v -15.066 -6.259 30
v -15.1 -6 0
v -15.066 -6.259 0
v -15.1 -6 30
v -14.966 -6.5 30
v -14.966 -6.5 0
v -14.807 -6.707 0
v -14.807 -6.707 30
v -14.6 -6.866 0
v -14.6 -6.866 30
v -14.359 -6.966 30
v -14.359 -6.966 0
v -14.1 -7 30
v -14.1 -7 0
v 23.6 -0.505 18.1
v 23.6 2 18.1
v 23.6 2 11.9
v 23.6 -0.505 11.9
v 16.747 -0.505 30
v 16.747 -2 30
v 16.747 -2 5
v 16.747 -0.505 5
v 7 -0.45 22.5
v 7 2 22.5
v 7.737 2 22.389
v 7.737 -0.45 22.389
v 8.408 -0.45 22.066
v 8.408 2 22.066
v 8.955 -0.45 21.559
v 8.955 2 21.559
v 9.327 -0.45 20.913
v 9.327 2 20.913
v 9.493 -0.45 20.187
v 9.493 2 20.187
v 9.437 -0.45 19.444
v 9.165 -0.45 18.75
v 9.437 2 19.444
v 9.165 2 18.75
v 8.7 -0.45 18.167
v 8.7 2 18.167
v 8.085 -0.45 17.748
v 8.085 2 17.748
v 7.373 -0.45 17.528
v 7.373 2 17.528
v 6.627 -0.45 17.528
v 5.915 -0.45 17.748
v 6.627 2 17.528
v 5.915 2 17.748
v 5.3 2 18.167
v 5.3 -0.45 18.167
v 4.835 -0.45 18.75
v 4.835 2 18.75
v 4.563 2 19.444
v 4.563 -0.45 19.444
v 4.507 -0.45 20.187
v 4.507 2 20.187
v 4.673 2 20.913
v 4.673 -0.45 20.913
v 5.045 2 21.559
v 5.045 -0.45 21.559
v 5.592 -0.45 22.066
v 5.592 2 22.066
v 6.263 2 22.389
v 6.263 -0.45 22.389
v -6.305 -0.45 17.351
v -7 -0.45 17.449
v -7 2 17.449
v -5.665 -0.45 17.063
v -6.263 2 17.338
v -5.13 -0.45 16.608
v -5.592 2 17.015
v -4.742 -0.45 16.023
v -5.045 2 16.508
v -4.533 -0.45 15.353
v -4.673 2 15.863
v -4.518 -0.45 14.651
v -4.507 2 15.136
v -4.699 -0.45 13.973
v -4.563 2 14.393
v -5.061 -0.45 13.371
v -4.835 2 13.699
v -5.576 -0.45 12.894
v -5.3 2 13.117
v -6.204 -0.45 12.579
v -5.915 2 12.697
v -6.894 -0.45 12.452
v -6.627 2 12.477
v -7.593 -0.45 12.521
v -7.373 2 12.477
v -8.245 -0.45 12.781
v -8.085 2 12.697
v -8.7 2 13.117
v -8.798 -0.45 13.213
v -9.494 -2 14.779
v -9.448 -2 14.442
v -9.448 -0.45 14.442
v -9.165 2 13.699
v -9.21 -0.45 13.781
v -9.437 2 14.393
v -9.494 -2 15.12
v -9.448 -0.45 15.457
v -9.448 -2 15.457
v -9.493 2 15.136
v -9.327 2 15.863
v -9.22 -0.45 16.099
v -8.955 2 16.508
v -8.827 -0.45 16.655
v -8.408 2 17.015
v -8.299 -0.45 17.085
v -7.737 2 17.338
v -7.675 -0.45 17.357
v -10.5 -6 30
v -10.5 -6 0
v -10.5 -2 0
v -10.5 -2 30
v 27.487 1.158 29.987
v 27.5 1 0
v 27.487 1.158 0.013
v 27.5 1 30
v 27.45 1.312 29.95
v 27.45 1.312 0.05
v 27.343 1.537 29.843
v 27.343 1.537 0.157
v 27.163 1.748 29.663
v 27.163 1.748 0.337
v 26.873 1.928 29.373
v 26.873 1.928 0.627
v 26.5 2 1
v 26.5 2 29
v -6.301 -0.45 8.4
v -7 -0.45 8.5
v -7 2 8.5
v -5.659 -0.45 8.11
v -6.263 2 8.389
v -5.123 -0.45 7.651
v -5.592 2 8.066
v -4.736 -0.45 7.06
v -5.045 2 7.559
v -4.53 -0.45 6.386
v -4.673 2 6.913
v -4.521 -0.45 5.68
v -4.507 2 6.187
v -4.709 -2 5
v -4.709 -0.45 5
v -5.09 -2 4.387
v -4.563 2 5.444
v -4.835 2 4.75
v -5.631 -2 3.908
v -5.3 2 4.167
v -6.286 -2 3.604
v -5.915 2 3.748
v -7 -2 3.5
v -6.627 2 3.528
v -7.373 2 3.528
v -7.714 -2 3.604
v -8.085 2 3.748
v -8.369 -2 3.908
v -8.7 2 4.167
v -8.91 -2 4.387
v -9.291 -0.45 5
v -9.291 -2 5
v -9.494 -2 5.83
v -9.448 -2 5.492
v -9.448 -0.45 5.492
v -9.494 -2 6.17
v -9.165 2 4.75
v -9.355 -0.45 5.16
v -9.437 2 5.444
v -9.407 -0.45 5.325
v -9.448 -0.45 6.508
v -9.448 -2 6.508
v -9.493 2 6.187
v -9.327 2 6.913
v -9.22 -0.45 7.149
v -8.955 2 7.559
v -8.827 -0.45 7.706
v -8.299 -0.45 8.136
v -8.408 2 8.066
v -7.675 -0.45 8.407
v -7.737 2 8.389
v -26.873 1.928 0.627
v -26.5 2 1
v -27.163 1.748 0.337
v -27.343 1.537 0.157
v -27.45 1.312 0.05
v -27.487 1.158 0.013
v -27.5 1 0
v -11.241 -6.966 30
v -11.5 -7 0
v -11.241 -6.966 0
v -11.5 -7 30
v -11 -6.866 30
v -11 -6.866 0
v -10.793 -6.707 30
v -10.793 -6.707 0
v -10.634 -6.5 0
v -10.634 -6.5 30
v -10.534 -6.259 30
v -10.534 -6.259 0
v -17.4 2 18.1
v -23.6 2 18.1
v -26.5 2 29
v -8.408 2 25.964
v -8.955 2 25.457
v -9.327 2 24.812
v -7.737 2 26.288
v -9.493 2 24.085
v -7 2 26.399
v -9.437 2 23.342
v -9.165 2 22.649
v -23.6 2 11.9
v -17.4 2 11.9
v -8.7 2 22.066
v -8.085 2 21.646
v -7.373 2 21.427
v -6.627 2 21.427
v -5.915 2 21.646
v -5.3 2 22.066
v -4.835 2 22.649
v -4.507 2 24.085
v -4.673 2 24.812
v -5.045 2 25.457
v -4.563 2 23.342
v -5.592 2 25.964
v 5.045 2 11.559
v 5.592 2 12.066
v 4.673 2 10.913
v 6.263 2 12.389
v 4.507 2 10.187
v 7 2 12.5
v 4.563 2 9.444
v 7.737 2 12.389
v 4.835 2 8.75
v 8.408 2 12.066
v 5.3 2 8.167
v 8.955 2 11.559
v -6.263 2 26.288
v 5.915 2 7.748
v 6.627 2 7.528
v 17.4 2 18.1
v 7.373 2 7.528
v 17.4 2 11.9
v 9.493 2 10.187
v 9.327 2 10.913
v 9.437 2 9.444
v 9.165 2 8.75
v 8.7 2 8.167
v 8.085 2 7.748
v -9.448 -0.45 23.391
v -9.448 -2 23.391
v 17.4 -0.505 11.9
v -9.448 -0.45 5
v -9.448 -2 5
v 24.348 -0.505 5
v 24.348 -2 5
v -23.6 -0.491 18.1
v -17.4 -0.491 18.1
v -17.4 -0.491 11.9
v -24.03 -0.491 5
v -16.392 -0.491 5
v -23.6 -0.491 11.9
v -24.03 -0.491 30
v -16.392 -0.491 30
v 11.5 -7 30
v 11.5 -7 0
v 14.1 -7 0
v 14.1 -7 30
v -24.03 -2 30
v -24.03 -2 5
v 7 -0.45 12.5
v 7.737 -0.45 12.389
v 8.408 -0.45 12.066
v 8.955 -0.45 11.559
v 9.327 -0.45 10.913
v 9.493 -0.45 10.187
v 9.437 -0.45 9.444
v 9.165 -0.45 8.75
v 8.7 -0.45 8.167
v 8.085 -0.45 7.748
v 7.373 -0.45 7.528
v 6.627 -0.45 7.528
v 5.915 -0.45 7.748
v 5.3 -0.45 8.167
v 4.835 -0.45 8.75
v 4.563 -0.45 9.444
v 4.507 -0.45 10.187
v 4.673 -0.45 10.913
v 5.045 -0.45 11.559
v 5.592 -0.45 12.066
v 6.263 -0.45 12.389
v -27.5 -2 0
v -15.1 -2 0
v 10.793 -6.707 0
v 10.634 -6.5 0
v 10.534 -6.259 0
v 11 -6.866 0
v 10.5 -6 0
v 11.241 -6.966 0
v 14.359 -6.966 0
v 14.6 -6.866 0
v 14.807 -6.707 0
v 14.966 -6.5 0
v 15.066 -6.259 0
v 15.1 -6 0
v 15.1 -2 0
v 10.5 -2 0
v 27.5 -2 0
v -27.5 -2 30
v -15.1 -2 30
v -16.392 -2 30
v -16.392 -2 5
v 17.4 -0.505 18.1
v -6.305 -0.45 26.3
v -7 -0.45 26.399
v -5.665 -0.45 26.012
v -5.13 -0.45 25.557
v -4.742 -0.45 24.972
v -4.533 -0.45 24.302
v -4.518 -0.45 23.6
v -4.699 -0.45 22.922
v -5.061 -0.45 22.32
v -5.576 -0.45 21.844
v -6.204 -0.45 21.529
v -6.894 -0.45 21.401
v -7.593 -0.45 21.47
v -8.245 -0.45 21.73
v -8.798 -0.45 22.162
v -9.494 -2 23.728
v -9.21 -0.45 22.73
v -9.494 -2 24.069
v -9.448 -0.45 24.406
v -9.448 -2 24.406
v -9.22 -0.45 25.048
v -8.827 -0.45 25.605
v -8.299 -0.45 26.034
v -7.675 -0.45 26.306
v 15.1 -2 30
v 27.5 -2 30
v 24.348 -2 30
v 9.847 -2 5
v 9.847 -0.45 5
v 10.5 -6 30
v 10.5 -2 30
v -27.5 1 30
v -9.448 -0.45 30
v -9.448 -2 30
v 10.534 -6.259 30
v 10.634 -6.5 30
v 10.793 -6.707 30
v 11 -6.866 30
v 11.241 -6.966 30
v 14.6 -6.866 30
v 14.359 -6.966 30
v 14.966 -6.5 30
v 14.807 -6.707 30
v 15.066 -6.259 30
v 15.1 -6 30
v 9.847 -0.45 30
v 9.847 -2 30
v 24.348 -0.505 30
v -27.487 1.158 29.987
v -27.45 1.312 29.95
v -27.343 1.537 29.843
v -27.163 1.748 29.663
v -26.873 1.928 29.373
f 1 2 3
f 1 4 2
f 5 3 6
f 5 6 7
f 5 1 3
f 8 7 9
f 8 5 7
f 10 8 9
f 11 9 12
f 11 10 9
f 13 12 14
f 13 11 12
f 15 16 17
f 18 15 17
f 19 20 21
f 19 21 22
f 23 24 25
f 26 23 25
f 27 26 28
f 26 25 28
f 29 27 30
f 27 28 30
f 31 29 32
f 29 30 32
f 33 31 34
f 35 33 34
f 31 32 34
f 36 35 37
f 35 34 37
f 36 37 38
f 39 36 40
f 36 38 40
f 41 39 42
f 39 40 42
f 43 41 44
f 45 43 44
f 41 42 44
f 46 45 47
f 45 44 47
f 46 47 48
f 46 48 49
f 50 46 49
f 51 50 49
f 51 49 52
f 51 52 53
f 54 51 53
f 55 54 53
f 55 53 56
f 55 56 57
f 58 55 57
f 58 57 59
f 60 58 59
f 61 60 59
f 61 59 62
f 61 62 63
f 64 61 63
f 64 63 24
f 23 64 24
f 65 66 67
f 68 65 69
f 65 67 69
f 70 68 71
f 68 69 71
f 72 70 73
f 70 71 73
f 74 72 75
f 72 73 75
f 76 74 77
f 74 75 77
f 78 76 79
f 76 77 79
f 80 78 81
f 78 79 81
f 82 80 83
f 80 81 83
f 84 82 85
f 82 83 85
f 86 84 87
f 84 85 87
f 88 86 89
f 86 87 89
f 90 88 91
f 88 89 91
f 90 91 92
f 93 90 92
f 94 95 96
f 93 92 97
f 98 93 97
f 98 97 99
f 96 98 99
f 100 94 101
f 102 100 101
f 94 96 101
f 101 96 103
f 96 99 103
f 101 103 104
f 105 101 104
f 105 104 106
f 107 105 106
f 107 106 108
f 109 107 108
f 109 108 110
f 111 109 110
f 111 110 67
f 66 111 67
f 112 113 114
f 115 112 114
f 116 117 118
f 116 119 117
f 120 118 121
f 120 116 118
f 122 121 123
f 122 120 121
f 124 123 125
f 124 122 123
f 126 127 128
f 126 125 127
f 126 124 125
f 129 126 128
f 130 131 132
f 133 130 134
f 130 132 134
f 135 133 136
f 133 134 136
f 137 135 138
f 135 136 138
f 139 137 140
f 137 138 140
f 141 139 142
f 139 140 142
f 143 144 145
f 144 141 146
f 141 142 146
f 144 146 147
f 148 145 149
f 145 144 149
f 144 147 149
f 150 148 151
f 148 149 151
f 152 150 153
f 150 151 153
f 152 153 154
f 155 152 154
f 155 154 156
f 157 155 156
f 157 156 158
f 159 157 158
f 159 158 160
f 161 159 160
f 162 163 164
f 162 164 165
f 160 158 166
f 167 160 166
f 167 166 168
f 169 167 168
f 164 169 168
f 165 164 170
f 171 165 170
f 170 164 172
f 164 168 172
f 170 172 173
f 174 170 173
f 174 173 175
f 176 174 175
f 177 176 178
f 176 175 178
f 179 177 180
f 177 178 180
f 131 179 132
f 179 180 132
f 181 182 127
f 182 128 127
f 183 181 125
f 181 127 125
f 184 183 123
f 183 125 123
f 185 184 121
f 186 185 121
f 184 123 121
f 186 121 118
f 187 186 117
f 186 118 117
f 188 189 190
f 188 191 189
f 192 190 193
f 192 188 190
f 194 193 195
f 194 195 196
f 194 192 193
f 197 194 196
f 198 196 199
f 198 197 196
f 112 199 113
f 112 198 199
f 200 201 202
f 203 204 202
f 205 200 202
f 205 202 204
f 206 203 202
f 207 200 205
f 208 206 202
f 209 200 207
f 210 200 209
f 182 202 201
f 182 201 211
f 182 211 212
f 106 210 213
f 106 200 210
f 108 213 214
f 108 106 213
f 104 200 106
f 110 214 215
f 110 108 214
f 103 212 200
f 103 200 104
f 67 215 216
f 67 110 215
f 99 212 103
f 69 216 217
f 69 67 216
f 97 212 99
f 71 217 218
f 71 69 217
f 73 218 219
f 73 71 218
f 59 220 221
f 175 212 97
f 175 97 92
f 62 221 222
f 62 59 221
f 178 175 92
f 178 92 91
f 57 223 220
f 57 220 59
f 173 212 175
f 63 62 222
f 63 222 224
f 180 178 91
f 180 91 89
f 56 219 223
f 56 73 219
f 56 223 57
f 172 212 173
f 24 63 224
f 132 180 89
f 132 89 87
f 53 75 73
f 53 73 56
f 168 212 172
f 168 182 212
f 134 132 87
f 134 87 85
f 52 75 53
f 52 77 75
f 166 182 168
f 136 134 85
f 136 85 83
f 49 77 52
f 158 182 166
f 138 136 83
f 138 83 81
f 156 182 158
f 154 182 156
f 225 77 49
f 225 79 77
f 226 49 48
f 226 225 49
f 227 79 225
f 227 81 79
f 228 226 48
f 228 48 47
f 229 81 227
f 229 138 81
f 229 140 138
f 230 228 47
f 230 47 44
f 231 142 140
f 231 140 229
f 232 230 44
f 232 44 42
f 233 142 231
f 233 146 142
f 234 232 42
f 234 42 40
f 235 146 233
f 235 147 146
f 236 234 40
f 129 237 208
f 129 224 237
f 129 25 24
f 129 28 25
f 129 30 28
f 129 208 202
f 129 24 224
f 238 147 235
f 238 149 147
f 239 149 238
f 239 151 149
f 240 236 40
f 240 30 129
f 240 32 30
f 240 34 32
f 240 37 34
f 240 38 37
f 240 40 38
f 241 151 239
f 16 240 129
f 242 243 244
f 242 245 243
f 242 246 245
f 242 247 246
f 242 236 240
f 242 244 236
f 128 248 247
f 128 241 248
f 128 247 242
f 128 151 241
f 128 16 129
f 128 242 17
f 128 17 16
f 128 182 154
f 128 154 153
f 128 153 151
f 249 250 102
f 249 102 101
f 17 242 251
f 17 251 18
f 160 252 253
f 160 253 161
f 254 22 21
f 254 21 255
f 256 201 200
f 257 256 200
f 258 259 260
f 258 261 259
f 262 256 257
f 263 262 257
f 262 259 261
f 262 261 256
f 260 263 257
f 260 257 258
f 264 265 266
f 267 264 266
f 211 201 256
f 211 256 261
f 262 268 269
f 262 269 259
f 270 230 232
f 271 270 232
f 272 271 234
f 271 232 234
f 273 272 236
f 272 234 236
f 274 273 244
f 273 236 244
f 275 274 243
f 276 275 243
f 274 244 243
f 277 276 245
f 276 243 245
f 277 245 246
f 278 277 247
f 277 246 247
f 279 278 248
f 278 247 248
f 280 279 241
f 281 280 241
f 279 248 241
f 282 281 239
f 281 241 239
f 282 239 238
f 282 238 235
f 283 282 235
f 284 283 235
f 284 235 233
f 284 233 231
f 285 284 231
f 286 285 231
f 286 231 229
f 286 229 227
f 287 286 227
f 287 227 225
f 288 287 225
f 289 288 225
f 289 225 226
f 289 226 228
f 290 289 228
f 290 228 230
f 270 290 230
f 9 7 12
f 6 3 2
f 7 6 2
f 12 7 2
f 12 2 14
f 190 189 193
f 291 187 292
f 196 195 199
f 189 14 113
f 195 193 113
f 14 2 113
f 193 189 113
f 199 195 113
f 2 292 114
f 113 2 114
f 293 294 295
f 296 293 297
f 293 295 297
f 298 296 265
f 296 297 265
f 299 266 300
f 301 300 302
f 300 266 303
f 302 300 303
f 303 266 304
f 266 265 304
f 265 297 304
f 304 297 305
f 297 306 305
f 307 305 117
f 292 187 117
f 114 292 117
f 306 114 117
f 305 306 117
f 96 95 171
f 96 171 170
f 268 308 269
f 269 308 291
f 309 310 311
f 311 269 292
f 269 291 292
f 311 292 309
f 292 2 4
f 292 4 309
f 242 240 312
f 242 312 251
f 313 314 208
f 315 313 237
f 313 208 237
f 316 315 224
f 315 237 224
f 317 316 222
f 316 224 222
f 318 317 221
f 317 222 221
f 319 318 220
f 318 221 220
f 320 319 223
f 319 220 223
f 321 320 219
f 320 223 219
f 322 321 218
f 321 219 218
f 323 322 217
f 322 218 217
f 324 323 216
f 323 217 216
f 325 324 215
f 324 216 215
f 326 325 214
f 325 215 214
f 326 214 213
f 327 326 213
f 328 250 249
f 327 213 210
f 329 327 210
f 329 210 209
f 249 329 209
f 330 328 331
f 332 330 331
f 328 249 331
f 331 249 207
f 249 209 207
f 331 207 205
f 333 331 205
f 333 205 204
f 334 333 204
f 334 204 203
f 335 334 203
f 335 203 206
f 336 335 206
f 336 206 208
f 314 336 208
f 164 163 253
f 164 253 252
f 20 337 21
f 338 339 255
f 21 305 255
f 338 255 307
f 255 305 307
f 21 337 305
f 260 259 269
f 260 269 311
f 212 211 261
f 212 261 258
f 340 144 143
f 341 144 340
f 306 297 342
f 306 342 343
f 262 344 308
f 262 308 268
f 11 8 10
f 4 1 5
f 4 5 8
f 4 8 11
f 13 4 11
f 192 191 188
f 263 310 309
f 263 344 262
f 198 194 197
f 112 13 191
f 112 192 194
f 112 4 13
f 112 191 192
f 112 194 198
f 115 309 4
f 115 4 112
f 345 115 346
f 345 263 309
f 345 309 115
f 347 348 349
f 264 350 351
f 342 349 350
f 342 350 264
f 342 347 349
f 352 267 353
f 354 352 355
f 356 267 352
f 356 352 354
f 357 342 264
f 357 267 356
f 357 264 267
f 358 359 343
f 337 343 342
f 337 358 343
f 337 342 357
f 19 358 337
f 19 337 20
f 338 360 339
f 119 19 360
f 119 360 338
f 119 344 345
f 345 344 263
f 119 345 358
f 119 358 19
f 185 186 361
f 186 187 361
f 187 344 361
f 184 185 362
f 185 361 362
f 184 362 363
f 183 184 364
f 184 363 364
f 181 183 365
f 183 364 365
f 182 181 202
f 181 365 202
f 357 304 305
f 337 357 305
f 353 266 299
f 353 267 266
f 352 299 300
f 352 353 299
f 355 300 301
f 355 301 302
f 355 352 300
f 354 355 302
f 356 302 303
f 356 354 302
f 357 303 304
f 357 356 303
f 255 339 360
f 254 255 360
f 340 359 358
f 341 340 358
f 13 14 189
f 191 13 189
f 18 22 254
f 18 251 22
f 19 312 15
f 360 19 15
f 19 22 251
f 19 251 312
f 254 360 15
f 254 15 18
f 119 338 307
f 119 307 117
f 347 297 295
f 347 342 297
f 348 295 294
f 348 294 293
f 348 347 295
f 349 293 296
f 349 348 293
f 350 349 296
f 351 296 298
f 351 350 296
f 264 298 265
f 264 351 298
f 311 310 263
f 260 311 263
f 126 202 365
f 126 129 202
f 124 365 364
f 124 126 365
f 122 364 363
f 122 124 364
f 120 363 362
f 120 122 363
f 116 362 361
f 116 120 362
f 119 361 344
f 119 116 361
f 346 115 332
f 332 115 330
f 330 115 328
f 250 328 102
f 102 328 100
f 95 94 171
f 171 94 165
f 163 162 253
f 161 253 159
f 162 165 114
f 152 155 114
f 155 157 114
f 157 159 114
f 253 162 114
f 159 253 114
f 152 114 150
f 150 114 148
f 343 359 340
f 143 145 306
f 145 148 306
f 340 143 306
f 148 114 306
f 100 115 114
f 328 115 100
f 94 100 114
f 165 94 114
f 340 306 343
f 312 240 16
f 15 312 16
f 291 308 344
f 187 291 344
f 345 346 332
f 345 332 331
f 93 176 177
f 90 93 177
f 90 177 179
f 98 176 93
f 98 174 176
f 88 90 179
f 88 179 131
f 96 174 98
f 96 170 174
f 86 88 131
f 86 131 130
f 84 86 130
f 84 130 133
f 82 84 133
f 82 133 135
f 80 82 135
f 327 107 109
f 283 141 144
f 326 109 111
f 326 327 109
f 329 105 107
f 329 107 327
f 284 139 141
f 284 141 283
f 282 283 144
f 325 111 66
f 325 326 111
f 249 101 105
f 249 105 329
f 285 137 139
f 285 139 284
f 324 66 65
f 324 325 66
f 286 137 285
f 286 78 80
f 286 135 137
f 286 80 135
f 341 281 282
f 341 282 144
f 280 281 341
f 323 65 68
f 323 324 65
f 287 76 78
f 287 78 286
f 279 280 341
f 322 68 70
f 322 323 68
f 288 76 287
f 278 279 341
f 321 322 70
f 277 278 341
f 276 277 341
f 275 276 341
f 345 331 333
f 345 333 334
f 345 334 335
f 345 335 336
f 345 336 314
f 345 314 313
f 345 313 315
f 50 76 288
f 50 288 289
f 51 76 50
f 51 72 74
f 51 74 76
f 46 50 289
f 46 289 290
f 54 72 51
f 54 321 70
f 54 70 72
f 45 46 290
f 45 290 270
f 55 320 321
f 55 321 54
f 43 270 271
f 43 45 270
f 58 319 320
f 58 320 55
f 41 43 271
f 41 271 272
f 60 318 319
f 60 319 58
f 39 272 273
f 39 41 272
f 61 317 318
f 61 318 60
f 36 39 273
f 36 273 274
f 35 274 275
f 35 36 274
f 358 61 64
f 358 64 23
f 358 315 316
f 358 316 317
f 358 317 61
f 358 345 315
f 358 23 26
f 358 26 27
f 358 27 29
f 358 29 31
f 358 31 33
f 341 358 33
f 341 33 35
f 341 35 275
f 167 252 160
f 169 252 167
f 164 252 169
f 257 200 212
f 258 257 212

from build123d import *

# Parameters (mm, degrees)
SKETCH1_W           = 55
SKETCH1_H           = 4
SKETCH1_W_2         = 4.6
SKETCH1_H_2         = 5
BOSS_EXTRUDE2_DEPTH = 30
FILLET1_R           = 1
SKETCH2_R           = 2.5
SKETCH2_W           = 6.2
SKETCH2_H           = 6.2
CUT_EXTRUDE1_DEPTH  = 10
SKETCH4_W           = 19.295263263
SKETCH4_H           = 1.550295644
SKETCH4_W_2         = 7.637827672
SKETCH4_H_2         = 1.509017847
SKETCH4_W_3         = 7.600819518
SKETCH4_H_3         = 1.495167717
CUT_EXTRUDE2_DEPTH  = 25


with BuildPart() as part:
    # Sketch1 → Boss-Extrude2 (new body)
    with BuildSketch(Plane.XY):
        Rectangle(SKETCH1_W, SKETCH1_H)
        with Locations((-12.8, -4.5)):
            Rectangle(SKETCH1_W_2, SKETCH1_H_2)
        with Locations((12.8, -4.5)):
            Rectangle(SKETCH1_W_2, SKETCH1_H_2)
    extrude(amount=BOSS_EXTRUDE2_DEPTH)

    # Fillet1
    fillet1_edges = [part.edges().sort_by_distance(p)[0] for p in [
        (0, 2, 30),
        (0, 2, 0),
        (15.1, -7, 15),
        (10.5, -7, 15),
        (-10.5, -7, 15),
        (-15.1, -7, 15),
        (-27.5, 2, 15),
        (27.5, 2, 15),
    ]]
    fillet(fillet1_edges, radius=FILLET1_R)

    # Sketch2 → Cut-Extrude1 (cut)
    with BuildSketch(Plane(origin=(0, 2, 0), x_dir=(1, 0, 0), z_dir=(0, 1, 0))):
        with Locations(Location((-7, -6, 0), (0, 0, 270))):
            Circle(SKETCH2_R)
        with Locations(Location((-7, -14.949297523, 0), (0, 0, 270))):
            Circle(SKETCH2_R)
        with Locations(Location((-7, -23.898595046, 0), (0, 0, 270))):
            Circle(SKETCH2_R)
        with Locations(Location((7, -20, 0), (0, 0, 270))):
            Circle(SKETCH2_R)
        with Locations(Location((7, -10, 0), (0, 0, 270))):
            Circle(SKETCH2_R)
        with Locations((-20.5, -15)):
            Rectangle(SKETCH2_W, SKETCH2_H)
        with Locations((20.5, -15)):
            Rectangle(SKETCH2_W, SKETCH2_H)
    extrude(amount=-CUT_EXTRUDE1_DEPTH, mode=Mode.SUBTRACT)

    # Sketch4 → Cut-Extrude2 (cut)
    with BuildSketch(Plane.XY.offset(30)):
        with Locations((0.199720154, -1.224852178)):
            Rectangle(SKETCH4_W, SKETCH4_H)
        with Locations((-20.210751877, -1.245491077)):
            Rectangle(SKETCH4_W_2, SKETCH4_H_2)
        with Locations((20.547753604, -1.252416141)):
            Rectangle(SKETCH4_W_3, SKETCH4_H_3)
    extrude(amount=-CUT_EXTRUDE2_DEPTH, mode=Mode.SUBTRACT)


solid = part.part
